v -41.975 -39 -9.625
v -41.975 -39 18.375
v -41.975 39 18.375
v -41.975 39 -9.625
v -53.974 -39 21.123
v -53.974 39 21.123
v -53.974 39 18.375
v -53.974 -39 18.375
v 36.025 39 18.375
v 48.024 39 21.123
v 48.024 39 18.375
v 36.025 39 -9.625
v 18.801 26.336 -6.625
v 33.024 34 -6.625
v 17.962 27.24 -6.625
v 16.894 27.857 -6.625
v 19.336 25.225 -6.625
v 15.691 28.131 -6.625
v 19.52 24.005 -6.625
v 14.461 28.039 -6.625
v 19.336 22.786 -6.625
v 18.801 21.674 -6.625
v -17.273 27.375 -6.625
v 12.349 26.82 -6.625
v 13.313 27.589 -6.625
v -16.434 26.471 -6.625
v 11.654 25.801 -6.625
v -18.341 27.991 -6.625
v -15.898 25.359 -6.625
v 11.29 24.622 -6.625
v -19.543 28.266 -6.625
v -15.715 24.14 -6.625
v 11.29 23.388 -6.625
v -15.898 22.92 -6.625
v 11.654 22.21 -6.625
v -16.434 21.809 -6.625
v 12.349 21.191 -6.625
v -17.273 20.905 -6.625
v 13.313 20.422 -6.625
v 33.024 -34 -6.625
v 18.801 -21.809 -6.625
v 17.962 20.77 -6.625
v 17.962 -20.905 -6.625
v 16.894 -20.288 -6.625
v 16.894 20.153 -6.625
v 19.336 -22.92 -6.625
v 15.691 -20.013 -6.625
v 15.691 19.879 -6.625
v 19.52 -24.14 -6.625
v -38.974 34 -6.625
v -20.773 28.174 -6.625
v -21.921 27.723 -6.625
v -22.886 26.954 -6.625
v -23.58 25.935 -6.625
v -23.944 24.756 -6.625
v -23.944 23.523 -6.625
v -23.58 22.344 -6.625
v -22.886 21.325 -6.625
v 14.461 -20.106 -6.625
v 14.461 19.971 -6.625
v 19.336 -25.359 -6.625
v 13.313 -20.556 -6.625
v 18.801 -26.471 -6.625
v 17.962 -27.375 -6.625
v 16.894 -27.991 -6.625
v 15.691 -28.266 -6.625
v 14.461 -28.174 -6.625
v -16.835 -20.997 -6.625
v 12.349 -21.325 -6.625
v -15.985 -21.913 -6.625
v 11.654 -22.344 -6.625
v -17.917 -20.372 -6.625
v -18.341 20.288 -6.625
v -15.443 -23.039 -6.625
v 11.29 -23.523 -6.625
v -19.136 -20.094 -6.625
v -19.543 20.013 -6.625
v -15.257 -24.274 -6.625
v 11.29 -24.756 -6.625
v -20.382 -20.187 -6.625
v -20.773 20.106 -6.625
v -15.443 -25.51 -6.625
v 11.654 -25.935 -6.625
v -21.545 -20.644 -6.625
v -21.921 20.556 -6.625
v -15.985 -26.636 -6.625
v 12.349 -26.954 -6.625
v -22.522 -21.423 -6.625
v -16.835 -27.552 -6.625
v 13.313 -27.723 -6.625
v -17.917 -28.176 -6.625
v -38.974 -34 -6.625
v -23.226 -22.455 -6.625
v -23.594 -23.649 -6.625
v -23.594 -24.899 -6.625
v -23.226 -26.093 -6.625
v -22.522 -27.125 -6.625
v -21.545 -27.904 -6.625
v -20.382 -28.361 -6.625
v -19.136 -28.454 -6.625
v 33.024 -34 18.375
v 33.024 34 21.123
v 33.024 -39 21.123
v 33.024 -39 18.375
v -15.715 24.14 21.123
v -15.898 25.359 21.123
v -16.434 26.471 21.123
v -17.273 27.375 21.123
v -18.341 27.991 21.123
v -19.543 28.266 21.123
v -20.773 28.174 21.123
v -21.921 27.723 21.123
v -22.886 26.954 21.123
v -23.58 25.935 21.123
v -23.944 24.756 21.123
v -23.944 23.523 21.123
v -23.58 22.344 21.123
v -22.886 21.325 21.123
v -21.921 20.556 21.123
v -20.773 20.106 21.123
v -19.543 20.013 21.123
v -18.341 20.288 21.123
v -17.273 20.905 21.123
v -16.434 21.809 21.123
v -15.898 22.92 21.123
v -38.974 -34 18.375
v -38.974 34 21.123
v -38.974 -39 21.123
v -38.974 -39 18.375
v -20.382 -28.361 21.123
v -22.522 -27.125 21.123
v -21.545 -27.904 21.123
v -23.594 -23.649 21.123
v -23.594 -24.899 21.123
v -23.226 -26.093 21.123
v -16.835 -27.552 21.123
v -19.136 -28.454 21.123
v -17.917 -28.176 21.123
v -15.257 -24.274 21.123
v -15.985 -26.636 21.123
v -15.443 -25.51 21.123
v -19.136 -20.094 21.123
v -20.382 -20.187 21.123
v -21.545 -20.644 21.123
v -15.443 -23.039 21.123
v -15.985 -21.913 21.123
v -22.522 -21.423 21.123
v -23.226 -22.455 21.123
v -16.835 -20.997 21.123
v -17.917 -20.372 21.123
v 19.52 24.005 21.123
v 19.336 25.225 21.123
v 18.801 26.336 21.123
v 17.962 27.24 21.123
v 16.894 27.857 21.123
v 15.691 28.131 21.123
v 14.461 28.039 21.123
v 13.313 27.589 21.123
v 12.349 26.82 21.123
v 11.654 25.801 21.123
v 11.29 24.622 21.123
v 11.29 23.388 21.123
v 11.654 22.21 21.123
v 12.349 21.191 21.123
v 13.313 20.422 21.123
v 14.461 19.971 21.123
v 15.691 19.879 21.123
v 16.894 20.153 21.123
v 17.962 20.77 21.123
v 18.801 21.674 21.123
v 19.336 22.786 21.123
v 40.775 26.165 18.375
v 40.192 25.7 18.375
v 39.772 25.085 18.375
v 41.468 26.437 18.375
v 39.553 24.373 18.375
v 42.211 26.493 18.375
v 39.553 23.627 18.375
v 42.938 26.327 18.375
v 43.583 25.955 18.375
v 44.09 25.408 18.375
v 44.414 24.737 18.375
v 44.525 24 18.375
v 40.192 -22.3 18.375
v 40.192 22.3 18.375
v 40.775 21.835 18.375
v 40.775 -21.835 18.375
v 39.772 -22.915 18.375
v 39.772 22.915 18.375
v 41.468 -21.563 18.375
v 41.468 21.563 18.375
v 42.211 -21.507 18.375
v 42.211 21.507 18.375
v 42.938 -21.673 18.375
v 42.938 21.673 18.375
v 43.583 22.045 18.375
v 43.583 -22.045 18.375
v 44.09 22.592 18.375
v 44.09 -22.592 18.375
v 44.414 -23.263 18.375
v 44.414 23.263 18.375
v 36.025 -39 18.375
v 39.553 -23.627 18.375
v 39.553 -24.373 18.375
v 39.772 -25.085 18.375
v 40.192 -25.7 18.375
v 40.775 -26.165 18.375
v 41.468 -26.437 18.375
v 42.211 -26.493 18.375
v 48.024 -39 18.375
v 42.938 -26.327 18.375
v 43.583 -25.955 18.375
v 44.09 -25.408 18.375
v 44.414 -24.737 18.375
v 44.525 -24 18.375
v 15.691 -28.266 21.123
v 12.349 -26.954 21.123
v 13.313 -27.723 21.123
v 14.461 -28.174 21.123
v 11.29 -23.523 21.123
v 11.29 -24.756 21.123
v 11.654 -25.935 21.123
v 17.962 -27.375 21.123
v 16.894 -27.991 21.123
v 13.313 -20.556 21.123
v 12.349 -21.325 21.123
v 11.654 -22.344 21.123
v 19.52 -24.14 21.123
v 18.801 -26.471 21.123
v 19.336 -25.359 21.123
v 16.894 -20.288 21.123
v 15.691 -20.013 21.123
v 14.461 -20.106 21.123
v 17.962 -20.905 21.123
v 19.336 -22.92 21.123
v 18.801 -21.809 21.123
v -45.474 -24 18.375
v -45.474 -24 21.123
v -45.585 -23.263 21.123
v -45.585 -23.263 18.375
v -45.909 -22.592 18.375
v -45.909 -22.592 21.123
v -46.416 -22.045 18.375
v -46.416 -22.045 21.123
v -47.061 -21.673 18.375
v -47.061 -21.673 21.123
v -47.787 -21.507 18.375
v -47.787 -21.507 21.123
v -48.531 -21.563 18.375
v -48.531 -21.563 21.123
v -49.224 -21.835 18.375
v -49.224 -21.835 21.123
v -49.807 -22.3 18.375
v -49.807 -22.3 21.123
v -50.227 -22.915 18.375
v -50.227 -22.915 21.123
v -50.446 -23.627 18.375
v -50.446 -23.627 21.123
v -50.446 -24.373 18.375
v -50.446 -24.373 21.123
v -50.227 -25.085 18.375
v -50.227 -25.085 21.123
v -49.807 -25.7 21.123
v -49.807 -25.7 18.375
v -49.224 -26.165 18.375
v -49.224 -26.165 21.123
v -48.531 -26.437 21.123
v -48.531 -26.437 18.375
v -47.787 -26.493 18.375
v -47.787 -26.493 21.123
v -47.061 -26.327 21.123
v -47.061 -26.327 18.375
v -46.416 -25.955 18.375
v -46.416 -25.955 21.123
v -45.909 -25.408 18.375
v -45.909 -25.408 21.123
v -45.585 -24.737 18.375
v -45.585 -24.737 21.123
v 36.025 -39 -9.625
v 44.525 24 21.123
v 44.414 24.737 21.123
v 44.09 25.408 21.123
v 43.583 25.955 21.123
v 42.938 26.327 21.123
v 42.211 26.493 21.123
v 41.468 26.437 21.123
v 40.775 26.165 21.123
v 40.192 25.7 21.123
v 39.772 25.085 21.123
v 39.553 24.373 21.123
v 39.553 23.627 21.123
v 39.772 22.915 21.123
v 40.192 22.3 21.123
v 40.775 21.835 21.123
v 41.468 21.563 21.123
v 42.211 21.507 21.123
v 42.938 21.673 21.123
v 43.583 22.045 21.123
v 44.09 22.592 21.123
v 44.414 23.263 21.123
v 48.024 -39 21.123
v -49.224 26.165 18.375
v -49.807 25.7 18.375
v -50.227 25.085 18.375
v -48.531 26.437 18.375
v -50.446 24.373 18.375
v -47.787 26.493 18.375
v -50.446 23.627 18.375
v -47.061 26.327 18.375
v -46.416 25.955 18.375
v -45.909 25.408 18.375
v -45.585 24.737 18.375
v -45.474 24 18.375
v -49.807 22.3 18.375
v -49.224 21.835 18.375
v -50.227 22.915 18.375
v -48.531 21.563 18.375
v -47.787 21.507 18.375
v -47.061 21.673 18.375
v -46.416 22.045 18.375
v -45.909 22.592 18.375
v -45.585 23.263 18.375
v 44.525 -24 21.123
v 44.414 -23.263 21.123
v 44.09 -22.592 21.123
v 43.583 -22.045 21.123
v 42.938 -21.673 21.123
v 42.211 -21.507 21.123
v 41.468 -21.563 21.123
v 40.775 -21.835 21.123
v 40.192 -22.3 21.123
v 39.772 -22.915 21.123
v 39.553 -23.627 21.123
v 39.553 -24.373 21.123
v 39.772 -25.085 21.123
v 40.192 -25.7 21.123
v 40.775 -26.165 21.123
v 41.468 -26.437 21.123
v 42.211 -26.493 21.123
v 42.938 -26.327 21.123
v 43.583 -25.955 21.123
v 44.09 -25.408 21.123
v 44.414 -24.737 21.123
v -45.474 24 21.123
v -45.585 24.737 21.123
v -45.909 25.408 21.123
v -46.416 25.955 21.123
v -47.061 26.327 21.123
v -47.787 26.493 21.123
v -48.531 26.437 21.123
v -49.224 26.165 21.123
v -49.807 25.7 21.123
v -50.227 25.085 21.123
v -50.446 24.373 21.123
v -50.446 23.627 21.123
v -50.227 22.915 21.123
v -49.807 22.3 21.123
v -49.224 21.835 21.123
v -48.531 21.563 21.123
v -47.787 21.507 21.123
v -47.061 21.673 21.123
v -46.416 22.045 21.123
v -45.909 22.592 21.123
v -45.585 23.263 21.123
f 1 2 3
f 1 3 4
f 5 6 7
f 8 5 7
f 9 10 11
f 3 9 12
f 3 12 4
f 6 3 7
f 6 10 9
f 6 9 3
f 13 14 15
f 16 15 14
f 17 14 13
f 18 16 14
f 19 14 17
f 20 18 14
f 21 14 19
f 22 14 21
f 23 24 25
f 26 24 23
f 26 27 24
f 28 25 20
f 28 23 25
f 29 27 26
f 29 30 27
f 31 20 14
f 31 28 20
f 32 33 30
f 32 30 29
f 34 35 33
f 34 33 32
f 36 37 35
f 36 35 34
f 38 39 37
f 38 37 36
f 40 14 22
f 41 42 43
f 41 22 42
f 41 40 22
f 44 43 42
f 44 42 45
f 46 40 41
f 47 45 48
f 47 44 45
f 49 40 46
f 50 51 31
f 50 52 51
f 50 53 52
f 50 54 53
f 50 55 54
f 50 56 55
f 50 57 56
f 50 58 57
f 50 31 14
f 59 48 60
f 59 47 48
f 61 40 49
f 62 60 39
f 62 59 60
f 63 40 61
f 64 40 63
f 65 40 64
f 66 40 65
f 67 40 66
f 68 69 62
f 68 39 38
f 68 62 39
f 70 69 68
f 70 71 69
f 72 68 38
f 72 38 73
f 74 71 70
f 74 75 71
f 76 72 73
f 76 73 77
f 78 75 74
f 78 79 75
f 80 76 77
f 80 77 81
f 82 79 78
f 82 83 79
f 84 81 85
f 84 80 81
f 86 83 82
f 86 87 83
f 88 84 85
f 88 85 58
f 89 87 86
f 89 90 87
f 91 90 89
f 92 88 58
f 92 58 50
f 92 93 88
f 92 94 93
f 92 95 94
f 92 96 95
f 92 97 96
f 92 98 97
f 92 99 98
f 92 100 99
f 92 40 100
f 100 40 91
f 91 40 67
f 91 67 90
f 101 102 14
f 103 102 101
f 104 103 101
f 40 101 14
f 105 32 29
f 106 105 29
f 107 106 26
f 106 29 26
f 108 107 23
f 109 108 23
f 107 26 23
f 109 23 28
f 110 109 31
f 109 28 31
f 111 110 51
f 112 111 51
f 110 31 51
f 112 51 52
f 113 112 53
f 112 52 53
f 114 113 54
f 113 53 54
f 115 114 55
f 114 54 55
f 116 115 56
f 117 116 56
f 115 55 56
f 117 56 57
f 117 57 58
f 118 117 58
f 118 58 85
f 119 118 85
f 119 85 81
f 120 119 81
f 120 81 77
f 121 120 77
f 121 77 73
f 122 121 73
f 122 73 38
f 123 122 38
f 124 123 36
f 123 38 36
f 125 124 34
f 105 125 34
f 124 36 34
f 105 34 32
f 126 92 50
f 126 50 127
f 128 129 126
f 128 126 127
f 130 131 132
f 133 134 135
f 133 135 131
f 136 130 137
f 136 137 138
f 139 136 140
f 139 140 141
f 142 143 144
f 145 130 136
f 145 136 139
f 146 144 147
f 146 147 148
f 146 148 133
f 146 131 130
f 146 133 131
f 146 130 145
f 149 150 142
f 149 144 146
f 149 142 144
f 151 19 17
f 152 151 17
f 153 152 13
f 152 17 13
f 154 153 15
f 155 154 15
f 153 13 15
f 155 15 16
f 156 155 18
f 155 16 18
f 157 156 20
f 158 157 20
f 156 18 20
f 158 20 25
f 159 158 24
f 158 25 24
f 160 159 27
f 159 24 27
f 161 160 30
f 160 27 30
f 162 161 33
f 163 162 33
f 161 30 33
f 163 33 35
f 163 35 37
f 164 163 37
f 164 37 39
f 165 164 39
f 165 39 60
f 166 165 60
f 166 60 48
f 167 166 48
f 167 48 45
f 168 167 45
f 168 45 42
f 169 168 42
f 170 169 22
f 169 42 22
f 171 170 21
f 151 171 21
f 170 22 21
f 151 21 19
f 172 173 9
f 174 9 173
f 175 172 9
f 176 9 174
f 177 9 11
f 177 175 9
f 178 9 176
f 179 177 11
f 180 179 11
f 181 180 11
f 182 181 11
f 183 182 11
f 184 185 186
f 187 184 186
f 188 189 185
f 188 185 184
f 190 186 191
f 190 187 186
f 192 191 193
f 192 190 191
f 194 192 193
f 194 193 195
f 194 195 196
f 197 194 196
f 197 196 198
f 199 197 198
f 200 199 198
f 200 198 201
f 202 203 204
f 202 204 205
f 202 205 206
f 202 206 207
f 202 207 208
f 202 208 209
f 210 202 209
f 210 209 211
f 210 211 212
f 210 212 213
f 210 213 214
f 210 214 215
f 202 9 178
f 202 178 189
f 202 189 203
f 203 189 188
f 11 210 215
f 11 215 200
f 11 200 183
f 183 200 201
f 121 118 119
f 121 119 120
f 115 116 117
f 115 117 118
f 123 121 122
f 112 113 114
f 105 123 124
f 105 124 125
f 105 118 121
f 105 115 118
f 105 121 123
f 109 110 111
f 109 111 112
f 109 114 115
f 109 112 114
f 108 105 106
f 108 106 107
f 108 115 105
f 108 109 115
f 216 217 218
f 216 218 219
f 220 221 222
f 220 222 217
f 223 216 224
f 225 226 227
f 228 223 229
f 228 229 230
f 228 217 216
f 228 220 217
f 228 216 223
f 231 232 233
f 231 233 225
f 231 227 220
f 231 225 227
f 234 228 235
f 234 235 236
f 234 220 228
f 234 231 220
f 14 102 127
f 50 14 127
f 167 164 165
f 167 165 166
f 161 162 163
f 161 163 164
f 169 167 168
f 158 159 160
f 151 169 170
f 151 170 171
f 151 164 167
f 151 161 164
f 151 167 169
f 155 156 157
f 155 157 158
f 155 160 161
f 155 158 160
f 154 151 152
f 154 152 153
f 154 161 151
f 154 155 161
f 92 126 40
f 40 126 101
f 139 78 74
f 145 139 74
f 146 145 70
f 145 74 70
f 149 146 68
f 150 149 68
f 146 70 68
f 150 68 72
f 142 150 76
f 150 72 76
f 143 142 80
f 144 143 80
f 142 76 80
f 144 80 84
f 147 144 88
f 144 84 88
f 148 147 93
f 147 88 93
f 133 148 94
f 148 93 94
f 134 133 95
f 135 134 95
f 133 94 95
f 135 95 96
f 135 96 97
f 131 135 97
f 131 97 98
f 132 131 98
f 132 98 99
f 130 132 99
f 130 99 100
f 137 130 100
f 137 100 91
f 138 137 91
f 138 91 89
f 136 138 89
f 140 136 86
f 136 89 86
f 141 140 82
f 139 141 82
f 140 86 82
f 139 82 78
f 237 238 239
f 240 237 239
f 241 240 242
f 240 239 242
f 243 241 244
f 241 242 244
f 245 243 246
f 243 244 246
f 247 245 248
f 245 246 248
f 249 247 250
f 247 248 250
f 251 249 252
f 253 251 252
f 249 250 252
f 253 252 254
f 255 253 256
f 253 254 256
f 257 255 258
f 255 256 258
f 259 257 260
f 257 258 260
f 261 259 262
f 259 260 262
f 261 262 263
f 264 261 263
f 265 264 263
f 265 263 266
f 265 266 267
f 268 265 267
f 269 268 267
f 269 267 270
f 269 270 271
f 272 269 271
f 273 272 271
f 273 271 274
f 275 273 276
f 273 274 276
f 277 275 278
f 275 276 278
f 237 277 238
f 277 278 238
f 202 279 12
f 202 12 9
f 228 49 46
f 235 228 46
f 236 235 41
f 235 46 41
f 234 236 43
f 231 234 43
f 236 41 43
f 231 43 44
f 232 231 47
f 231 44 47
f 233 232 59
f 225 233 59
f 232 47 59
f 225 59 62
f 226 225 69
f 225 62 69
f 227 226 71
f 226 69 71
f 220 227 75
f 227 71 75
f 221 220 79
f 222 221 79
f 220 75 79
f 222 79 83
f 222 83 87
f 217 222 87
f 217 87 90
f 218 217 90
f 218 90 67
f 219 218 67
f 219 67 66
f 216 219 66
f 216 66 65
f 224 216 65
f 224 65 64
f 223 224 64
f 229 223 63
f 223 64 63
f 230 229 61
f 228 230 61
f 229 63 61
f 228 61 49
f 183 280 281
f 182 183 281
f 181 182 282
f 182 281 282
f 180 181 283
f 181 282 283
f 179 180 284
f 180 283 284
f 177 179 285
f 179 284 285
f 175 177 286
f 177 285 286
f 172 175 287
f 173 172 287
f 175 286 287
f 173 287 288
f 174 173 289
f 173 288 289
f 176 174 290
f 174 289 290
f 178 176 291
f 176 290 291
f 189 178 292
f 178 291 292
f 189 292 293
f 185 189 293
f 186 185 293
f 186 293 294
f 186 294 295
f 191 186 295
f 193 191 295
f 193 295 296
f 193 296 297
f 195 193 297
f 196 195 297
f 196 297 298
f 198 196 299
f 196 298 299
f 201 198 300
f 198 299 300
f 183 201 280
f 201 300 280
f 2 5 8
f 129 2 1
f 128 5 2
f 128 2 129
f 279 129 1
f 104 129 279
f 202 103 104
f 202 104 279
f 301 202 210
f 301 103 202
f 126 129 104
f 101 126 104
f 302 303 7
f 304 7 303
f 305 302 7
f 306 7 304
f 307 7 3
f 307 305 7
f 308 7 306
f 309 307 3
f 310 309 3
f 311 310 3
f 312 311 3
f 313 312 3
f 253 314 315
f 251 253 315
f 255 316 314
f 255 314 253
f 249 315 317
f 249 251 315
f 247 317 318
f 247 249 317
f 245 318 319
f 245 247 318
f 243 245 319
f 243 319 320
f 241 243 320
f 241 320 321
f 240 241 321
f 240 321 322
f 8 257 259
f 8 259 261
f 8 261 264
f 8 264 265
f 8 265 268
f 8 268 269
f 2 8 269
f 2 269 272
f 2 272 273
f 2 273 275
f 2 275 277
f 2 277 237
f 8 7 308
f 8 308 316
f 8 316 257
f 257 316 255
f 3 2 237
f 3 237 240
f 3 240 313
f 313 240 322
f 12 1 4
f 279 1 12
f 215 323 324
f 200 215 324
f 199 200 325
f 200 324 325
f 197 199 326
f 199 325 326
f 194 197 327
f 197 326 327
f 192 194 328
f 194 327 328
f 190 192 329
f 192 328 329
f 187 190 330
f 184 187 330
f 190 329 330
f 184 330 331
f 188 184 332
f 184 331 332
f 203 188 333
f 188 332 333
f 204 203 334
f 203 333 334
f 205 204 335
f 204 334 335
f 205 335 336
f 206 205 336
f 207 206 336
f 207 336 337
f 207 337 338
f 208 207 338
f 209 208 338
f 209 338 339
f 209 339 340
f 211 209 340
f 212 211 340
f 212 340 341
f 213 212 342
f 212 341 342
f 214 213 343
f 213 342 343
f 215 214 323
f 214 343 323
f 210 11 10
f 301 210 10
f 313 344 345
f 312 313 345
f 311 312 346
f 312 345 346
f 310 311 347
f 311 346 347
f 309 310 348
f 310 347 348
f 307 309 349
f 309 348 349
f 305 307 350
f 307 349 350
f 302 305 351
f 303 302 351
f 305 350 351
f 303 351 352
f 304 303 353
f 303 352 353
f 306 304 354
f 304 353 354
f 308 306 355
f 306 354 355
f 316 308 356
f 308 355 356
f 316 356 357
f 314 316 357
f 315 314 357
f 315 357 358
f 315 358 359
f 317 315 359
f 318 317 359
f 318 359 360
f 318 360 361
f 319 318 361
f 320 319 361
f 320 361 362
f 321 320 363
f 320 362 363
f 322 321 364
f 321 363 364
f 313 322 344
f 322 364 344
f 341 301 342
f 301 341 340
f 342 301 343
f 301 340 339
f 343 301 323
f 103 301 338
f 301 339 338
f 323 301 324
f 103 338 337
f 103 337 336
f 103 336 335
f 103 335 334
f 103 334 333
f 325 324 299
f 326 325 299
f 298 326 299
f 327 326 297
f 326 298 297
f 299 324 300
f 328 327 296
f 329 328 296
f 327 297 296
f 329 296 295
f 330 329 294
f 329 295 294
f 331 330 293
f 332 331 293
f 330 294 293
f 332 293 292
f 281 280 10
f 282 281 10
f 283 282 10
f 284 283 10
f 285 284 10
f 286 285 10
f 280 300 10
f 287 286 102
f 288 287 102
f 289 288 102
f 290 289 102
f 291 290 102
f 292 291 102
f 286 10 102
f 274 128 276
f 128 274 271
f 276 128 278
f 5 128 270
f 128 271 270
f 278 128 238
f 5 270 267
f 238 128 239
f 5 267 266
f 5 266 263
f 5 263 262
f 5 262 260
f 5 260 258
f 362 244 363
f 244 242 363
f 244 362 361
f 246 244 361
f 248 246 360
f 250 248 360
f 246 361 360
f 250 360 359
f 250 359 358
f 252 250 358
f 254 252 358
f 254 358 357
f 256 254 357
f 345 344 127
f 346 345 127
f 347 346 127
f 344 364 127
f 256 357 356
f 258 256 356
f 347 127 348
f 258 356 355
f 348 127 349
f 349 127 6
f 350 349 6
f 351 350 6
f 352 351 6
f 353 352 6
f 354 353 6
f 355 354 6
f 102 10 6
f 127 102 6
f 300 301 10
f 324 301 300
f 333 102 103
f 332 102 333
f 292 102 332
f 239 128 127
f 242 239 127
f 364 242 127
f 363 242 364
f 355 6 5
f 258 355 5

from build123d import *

# Parameters (mm, degrees)
F1_DEPTH = 39
F2_R     = 2.5
F3_DEPTH = 2.748386896
F4_R     = 4.1378331658
F4_R_2   = 4.1919705303
F5_DEPTH = 27.748386896
F6_W     = 71.9977971367
F6_H     = 25
F7_DEPTH = 5
F8_W     = 71.9977971367
F8_H     = 27.748386896
F9_DEPTH = 5


with BuildPart() as f1:
    # F0 (on Front) → F1 (new body, symmetric)
    with BuildSketch(Plane.XZ):
        Polygon((33.0240737289, -6.6249261405), (-2.9748248395, -6.6249261405), (-2.9748248395, -9.6249261405), (36.0251751605, -9.6249261405), (36.0251751605, 18.3750738595), (48.0240737289, 18.3750738595), (48.0240737289, 21.1234607555), (33.0240737289, 21.1234607555), align=None)
        Polygon((-2.9748248395, -9.6249261405), (-2.9748248395, -6.6249261405), (-38.9737234078, -6.6249261405), (-38.9737234078, 21.1234607555), (-53.9737234078, 21.1234607555), (-53.9737234078, 18.3750738595), (-41.9748248395, 18.3750738595), (-41.9748248395, -9.6249261405), align=None)
    extrude(amount=F1_DEPTH, both=True)

    # F2 (on face) → F3 (cut, through all)
    with BuildSketch(Plane.XY.offset(21.1234607555)):
        with Locations((42.0246244447, -24)):
            Circle(F2_R)
        with Locations((42.0246244447, 24)):
            Circle(F2_R)
        with Locations((-47.9742741236, 24)):
            Circle(F2_R)
        with Locations((-47.9742741236, -24)):
            Circle(F2_R)
    extrude(amount=-F3_DEPTH, mode=Mode.SUBTRACT)

    # F4 (on face) → F5 (join, through all)
    with BuildSketch(Plane.XY.offset(-6.6249261405)):
        with Locations((15.3820728883, 24.0051727742)):
            Circle(F4_R)
        with Locations((15.3820728883, -24.139655754)):
            Circle(F4_R)
        with Locations((-19.8524110019, 24.139655754)):
            Circle(F4_R)
        with Locations((-19.4489639252, -24.2741387337)):
            Circle(F4_R_2)
    extrude(amount=F5_DEPTH)

    # F6 (on face) → F7 (join)
    with BuildSketch(Plane.XZ.offset(39)):
        with Locations((-2.9748248395, 5.8750738595)):
            Rectangle(F6_W, F6_H)
    extrude(amount=-F7_DEPTH)

    # F8 (on face) → F9 (join)
    with BuildSketch(Plane(origin=(0, 39, 0), x_dir=(-1, 0, 0), z_dir=(0, 1, 0))):
        with Locations((2.9748248395, 7.2492673075)):
            Rectangle(F8_W, F8_H)
    extrude(amount=-F9_DEPTH)


solid = f1.part
